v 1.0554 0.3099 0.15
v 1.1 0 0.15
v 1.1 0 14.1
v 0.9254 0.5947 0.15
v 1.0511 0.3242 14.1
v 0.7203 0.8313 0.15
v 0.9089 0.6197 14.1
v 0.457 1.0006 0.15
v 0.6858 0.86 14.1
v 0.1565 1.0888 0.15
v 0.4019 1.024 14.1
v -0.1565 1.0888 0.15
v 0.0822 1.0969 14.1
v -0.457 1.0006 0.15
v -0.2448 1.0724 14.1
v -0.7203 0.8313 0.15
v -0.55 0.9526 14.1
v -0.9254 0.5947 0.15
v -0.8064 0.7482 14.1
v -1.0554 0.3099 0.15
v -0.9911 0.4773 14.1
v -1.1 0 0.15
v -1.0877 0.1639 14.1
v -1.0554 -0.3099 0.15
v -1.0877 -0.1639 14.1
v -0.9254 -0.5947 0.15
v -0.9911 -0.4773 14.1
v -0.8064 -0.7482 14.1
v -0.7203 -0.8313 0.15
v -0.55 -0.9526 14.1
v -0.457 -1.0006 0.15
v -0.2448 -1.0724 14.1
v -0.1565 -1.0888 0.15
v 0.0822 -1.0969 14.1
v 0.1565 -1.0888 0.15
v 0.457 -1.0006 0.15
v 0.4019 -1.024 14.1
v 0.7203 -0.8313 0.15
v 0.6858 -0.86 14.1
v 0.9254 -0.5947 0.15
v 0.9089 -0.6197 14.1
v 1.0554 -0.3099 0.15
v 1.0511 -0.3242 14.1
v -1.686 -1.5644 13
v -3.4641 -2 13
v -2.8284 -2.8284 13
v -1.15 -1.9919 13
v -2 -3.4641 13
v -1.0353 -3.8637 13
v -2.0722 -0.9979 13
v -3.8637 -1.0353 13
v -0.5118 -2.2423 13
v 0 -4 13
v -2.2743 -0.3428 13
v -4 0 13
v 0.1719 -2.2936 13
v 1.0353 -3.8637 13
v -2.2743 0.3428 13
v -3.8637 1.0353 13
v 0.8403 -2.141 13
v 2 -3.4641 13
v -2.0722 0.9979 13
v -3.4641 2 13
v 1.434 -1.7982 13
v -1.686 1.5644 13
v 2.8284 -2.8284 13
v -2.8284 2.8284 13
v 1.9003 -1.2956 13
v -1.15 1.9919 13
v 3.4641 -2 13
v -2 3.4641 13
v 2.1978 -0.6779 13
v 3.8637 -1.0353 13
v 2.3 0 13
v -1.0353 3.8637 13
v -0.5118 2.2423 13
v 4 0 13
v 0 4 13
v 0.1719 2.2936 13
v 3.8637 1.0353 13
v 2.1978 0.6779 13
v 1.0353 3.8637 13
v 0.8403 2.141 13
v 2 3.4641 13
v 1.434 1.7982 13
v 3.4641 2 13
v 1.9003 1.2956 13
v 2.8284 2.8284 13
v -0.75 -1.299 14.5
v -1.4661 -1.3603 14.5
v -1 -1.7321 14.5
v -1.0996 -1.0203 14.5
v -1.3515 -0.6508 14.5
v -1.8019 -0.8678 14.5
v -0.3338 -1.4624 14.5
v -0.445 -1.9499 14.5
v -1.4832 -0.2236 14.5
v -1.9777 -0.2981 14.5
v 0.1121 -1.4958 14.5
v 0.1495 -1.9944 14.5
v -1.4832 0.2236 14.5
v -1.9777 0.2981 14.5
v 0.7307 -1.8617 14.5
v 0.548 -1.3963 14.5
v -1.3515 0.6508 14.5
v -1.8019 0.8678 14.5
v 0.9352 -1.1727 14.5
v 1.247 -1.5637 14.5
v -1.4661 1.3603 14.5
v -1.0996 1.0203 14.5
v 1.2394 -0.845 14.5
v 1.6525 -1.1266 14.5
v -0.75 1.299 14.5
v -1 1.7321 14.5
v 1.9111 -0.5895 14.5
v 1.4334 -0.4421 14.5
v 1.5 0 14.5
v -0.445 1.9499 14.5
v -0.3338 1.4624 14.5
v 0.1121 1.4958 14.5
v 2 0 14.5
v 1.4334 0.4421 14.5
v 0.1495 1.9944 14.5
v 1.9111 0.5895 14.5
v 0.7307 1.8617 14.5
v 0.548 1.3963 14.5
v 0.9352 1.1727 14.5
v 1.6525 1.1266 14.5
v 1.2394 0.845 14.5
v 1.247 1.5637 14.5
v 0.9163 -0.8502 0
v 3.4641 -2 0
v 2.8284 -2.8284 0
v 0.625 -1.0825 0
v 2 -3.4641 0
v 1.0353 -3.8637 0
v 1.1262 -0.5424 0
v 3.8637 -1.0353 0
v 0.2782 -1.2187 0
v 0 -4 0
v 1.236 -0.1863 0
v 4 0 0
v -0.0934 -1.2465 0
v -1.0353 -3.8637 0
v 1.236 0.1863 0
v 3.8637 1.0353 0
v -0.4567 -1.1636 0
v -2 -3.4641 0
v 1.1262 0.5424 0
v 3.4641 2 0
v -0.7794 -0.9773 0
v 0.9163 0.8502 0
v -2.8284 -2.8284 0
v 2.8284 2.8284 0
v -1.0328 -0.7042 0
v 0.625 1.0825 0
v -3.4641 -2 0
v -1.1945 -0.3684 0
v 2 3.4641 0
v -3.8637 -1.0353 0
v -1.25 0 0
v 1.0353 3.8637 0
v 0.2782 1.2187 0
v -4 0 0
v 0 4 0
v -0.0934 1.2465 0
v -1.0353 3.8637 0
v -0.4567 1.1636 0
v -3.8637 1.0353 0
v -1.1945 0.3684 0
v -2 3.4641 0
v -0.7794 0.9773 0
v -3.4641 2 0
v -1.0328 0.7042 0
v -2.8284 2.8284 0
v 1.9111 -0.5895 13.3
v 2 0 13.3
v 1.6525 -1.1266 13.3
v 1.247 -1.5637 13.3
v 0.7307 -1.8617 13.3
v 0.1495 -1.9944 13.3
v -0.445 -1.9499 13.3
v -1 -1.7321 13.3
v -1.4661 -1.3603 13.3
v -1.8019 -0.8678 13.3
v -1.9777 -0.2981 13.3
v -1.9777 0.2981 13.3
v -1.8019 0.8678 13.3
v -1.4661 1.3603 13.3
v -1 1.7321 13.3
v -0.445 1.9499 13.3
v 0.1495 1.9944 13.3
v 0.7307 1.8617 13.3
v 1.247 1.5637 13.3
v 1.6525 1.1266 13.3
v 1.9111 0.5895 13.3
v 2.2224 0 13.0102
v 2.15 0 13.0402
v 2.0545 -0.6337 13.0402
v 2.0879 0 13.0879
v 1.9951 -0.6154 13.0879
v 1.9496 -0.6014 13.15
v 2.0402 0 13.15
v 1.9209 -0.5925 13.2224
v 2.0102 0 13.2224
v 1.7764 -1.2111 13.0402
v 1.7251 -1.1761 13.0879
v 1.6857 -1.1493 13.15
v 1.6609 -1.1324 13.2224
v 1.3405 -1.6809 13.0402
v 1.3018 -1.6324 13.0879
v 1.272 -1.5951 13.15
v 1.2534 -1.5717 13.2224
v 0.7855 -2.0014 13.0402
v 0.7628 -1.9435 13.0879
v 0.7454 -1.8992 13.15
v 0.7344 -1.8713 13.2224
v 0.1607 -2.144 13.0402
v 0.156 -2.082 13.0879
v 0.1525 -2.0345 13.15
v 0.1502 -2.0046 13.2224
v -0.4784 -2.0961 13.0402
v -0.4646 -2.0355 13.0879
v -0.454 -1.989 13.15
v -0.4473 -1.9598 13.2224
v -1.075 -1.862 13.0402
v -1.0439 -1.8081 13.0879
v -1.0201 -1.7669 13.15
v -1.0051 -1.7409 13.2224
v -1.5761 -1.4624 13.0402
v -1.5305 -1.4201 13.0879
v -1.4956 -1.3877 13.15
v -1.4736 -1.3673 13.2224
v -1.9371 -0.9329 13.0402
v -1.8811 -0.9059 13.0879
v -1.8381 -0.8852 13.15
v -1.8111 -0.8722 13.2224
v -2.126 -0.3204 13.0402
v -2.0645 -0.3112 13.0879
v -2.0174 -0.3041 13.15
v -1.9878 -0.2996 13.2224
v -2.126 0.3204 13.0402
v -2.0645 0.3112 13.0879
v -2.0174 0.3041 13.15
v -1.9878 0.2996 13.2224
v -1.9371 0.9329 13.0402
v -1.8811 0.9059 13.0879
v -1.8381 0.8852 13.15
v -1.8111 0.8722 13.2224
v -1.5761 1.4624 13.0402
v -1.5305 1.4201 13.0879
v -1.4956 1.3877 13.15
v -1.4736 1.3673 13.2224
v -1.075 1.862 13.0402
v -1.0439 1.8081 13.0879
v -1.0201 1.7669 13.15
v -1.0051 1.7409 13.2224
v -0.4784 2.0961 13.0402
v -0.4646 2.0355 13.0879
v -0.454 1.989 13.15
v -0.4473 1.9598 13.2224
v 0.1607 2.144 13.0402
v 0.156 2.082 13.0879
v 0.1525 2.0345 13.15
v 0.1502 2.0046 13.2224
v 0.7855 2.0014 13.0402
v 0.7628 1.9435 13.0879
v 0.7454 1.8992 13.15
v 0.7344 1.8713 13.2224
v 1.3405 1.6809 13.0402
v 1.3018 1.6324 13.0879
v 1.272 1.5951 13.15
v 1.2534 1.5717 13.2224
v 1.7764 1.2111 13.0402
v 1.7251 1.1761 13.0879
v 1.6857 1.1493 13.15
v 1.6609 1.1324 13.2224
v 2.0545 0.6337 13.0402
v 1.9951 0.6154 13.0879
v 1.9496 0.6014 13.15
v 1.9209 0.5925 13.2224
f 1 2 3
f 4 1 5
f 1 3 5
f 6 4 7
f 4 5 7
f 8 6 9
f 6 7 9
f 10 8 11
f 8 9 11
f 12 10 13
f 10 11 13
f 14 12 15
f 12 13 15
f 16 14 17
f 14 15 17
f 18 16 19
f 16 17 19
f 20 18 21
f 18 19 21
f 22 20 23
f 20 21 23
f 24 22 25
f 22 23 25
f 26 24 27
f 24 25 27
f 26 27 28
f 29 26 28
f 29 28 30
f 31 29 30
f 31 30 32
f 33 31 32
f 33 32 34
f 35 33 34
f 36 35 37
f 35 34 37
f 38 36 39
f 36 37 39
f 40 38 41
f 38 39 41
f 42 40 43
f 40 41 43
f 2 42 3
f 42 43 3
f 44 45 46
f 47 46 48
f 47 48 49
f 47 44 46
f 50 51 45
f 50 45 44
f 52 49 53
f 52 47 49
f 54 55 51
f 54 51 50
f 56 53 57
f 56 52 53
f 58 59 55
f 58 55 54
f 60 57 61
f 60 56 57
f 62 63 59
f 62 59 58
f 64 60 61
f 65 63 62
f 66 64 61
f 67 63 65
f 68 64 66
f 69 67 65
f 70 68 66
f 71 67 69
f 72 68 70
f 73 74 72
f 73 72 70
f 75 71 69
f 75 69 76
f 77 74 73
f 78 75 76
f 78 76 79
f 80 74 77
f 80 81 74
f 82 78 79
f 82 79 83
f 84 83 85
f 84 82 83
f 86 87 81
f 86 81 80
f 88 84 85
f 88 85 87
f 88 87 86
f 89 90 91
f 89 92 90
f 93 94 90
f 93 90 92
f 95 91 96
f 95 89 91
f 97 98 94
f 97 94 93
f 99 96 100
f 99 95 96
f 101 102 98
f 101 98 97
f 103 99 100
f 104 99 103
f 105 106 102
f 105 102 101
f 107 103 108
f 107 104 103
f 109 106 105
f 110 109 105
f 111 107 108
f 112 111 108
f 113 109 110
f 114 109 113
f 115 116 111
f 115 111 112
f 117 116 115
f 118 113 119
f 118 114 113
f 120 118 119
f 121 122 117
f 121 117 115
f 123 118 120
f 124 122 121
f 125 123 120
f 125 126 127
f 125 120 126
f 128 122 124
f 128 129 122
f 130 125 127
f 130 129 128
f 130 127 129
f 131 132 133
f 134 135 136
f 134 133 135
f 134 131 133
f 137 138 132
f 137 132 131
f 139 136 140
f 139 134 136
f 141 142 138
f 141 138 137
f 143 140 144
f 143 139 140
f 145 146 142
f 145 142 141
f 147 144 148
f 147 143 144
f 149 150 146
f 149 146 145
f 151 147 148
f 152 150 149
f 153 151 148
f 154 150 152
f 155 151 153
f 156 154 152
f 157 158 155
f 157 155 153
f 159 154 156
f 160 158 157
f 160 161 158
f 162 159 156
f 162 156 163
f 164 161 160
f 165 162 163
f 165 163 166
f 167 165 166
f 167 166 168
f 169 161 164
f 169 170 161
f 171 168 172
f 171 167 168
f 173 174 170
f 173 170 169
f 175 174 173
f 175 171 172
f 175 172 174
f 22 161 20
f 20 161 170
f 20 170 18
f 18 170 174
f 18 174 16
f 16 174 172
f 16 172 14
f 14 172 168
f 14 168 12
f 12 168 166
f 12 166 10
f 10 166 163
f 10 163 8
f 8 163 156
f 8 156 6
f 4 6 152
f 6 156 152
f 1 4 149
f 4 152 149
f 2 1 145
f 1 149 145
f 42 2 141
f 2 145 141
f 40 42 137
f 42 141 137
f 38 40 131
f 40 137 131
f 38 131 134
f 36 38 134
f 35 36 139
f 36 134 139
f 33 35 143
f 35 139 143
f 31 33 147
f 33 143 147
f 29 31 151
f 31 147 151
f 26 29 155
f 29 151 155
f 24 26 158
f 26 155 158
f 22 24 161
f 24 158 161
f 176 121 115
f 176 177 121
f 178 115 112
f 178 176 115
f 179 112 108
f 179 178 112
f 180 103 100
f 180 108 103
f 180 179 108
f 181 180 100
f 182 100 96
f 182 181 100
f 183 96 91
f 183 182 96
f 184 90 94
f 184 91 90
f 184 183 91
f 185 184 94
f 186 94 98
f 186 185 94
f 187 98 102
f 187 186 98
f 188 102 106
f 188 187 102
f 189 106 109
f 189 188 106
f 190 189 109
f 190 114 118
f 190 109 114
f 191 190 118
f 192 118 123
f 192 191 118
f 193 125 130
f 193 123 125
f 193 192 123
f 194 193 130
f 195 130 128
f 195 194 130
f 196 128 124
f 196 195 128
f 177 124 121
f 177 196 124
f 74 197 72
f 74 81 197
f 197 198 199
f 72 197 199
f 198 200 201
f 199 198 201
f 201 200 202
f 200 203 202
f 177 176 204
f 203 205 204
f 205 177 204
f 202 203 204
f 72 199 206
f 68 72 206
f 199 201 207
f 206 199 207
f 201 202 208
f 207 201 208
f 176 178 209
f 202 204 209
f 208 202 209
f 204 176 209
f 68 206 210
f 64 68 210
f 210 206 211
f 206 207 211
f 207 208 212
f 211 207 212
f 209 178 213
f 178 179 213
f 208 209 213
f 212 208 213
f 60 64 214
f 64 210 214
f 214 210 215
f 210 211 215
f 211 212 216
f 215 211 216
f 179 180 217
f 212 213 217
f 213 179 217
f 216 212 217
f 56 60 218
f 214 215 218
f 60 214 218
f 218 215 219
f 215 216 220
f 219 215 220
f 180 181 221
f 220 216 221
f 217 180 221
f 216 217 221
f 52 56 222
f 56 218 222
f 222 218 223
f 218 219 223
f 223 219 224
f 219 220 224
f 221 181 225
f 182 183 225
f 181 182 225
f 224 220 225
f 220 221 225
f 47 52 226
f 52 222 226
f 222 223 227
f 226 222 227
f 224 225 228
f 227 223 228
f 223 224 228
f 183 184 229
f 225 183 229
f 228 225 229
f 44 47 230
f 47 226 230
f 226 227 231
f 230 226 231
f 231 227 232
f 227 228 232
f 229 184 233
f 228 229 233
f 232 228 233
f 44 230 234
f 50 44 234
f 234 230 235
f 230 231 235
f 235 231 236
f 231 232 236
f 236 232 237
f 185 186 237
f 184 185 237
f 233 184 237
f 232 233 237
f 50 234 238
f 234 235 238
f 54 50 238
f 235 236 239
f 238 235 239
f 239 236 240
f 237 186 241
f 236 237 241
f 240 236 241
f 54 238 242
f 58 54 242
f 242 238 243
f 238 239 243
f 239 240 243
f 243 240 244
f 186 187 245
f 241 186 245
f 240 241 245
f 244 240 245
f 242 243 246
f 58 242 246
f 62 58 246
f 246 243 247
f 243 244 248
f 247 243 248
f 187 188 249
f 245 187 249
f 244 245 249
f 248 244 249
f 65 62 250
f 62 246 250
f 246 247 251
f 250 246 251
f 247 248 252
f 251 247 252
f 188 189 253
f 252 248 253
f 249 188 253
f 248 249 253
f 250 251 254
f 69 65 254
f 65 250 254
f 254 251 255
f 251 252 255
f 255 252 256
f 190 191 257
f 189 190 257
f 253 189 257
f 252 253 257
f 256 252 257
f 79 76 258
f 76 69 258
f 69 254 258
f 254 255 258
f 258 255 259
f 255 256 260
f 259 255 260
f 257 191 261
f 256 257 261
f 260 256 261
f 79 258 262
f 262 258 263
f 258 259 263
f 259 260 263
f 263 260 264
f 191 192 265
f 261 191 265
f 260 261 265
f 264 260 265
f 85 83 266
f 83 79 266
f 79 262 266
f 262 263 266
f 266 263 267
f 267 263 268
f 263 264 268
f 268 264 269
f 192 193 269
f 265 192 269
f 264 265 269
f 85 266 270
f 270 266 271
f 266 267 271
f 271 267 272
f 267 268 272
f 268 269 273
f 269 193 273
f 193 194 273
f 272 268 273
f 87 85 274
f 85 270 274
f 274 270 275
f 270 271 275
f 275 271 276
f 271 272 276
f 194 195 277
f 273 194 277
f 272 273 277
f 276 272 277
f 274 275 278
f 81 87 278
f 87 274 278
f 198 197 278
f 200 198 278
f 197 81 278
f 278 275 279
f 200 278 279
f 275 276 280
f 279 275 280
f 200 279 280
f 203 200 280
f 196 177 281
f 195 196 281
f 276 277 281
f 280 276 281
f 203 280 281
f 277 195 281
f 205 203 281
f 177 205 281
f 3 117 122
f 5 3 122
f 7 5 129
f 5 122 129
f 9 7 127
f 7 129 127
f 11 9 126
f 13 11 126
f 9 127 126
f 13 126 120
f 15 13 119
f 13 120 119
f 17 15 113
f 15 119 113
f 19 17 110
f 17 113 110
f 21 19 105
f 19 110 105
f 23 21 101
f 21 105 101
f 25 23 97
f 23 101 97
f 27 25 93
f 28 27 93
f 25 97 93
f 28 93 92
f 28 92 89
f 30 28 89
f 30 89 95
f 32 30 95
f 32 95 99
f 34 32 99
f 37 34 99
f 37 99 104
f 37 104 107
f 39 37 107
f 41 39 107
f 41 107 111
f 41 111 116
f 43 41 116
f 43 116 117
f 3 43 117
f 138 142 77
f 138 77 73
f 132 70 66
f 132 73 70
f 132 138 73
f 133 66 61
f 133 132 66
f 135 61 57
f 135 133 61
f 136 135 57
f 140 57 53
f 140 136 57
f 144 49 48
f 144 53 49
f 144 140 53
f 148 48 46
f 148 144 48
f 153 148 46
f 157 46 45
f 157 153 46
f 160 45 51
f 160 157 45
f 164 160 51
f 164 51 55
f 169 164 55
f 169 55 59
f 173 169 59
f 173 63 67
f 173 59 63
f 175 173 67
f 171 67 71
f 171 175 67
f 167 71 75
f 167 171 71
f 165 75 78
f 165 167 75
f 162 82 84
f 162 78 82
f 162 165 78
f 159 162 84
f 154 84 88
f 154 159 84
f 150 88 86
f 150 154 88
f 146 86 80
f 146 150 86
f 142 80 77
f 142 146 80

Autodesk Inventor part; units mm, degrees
ref_plane "XY Plane" through (0, 0, 0) normal (0, 0, 1) x (1, 0, 0)
sketch "Sketch1" plane through (0, 0, 0) normal (0, 0, 1) x (1, 0, 0)
  circle A0 centre (0, 0) radius 1 projected
  circle A1 centre (0, 0) radius 4 projected
extrude "Extrusion1" add sketch "Sketch1" along normal blind 13
sketch "Sketch2" plane through (0, 0, 13) normal (0, 0, 1) x (1, 0, 0)
  circle A0 centre (0, 0) radius 1 projected
  circle A1 centre (0, 0) radius 4 projected
  circle A2 centre (0, 0) radius 2
  dimension "d5" = 4
extrude "Extrusion2" add sketch "Sketch2" along normal blind 1.5 contours A2
sketch "Sketch3" plane through (0, 0, 0) normal (0, 0, -1) x (-1, 0, 0)
  circle A0 centre (0, 0) radius 1 projected
  circle A1 centre (0, 0) radius 4 projected
  circle A2 centre (0, 0) radius 1.05
  dimension "d8" = 2.1
extrude "Extrusion3" cut sketch "Sketch3" against normal blind 20 contours A2
sketch "Sketch4" plane through (0, 0, 0) normal (0, 0, -1) x (-1, 0, 0)
  circle A0 centre (0, 0) radius 1.05 projected
  circle A1 centre (0, 0) radius 4 projected
extrude "Extrusion4" add sketch "Sketch4" along normal blind 0.5
sketch "Sketch5" plane through (0, 0, -0.5) normal (0, 0, -1) x (-1, 0, 0)
  circle A0 centre (0, 0) radius 1.05 projected
  circle A1 centre (0, 0) radius 4 projected
extrude "Extrusion5" add sketch "Sketch5" along normal blind 0.5
sketch "Sketch6" plane through (0, 0, -1) normal (0, 0, -1) x (-1, 0, 0)
  circle A0 centre (0, 0) radius 1.05 projected
  circle A1 centre (0, 0) radius 4 projected
extrude "Extrusion6" cut sketch "Sketch6" against normal blind 1
chamfer "Chamfer2" distance 0.2 angle 45 1 edges at (1.05, 0, 0)
sketch "Sketch7" plane through (0, 0, 14.5) normal (0, 0, 1) x (1, 0, 0)
  circle A0 centre (0, 0) radius 2 projected
  circle A1 centre (0, 0) radius 1.1
  dimension "d20" = 2.2
extrude "Extrusion7" cut sketch "Sketch7" against normal blind 30 contours A1
fillet "Fillet1" radius 0.3 1 edges at (-2, 0, 13)
chamfer "Chamfer3" distance 0.4 angle 45 1 edges at (-1.1, 0, 14.5)
properties material "PBT Plastic"
